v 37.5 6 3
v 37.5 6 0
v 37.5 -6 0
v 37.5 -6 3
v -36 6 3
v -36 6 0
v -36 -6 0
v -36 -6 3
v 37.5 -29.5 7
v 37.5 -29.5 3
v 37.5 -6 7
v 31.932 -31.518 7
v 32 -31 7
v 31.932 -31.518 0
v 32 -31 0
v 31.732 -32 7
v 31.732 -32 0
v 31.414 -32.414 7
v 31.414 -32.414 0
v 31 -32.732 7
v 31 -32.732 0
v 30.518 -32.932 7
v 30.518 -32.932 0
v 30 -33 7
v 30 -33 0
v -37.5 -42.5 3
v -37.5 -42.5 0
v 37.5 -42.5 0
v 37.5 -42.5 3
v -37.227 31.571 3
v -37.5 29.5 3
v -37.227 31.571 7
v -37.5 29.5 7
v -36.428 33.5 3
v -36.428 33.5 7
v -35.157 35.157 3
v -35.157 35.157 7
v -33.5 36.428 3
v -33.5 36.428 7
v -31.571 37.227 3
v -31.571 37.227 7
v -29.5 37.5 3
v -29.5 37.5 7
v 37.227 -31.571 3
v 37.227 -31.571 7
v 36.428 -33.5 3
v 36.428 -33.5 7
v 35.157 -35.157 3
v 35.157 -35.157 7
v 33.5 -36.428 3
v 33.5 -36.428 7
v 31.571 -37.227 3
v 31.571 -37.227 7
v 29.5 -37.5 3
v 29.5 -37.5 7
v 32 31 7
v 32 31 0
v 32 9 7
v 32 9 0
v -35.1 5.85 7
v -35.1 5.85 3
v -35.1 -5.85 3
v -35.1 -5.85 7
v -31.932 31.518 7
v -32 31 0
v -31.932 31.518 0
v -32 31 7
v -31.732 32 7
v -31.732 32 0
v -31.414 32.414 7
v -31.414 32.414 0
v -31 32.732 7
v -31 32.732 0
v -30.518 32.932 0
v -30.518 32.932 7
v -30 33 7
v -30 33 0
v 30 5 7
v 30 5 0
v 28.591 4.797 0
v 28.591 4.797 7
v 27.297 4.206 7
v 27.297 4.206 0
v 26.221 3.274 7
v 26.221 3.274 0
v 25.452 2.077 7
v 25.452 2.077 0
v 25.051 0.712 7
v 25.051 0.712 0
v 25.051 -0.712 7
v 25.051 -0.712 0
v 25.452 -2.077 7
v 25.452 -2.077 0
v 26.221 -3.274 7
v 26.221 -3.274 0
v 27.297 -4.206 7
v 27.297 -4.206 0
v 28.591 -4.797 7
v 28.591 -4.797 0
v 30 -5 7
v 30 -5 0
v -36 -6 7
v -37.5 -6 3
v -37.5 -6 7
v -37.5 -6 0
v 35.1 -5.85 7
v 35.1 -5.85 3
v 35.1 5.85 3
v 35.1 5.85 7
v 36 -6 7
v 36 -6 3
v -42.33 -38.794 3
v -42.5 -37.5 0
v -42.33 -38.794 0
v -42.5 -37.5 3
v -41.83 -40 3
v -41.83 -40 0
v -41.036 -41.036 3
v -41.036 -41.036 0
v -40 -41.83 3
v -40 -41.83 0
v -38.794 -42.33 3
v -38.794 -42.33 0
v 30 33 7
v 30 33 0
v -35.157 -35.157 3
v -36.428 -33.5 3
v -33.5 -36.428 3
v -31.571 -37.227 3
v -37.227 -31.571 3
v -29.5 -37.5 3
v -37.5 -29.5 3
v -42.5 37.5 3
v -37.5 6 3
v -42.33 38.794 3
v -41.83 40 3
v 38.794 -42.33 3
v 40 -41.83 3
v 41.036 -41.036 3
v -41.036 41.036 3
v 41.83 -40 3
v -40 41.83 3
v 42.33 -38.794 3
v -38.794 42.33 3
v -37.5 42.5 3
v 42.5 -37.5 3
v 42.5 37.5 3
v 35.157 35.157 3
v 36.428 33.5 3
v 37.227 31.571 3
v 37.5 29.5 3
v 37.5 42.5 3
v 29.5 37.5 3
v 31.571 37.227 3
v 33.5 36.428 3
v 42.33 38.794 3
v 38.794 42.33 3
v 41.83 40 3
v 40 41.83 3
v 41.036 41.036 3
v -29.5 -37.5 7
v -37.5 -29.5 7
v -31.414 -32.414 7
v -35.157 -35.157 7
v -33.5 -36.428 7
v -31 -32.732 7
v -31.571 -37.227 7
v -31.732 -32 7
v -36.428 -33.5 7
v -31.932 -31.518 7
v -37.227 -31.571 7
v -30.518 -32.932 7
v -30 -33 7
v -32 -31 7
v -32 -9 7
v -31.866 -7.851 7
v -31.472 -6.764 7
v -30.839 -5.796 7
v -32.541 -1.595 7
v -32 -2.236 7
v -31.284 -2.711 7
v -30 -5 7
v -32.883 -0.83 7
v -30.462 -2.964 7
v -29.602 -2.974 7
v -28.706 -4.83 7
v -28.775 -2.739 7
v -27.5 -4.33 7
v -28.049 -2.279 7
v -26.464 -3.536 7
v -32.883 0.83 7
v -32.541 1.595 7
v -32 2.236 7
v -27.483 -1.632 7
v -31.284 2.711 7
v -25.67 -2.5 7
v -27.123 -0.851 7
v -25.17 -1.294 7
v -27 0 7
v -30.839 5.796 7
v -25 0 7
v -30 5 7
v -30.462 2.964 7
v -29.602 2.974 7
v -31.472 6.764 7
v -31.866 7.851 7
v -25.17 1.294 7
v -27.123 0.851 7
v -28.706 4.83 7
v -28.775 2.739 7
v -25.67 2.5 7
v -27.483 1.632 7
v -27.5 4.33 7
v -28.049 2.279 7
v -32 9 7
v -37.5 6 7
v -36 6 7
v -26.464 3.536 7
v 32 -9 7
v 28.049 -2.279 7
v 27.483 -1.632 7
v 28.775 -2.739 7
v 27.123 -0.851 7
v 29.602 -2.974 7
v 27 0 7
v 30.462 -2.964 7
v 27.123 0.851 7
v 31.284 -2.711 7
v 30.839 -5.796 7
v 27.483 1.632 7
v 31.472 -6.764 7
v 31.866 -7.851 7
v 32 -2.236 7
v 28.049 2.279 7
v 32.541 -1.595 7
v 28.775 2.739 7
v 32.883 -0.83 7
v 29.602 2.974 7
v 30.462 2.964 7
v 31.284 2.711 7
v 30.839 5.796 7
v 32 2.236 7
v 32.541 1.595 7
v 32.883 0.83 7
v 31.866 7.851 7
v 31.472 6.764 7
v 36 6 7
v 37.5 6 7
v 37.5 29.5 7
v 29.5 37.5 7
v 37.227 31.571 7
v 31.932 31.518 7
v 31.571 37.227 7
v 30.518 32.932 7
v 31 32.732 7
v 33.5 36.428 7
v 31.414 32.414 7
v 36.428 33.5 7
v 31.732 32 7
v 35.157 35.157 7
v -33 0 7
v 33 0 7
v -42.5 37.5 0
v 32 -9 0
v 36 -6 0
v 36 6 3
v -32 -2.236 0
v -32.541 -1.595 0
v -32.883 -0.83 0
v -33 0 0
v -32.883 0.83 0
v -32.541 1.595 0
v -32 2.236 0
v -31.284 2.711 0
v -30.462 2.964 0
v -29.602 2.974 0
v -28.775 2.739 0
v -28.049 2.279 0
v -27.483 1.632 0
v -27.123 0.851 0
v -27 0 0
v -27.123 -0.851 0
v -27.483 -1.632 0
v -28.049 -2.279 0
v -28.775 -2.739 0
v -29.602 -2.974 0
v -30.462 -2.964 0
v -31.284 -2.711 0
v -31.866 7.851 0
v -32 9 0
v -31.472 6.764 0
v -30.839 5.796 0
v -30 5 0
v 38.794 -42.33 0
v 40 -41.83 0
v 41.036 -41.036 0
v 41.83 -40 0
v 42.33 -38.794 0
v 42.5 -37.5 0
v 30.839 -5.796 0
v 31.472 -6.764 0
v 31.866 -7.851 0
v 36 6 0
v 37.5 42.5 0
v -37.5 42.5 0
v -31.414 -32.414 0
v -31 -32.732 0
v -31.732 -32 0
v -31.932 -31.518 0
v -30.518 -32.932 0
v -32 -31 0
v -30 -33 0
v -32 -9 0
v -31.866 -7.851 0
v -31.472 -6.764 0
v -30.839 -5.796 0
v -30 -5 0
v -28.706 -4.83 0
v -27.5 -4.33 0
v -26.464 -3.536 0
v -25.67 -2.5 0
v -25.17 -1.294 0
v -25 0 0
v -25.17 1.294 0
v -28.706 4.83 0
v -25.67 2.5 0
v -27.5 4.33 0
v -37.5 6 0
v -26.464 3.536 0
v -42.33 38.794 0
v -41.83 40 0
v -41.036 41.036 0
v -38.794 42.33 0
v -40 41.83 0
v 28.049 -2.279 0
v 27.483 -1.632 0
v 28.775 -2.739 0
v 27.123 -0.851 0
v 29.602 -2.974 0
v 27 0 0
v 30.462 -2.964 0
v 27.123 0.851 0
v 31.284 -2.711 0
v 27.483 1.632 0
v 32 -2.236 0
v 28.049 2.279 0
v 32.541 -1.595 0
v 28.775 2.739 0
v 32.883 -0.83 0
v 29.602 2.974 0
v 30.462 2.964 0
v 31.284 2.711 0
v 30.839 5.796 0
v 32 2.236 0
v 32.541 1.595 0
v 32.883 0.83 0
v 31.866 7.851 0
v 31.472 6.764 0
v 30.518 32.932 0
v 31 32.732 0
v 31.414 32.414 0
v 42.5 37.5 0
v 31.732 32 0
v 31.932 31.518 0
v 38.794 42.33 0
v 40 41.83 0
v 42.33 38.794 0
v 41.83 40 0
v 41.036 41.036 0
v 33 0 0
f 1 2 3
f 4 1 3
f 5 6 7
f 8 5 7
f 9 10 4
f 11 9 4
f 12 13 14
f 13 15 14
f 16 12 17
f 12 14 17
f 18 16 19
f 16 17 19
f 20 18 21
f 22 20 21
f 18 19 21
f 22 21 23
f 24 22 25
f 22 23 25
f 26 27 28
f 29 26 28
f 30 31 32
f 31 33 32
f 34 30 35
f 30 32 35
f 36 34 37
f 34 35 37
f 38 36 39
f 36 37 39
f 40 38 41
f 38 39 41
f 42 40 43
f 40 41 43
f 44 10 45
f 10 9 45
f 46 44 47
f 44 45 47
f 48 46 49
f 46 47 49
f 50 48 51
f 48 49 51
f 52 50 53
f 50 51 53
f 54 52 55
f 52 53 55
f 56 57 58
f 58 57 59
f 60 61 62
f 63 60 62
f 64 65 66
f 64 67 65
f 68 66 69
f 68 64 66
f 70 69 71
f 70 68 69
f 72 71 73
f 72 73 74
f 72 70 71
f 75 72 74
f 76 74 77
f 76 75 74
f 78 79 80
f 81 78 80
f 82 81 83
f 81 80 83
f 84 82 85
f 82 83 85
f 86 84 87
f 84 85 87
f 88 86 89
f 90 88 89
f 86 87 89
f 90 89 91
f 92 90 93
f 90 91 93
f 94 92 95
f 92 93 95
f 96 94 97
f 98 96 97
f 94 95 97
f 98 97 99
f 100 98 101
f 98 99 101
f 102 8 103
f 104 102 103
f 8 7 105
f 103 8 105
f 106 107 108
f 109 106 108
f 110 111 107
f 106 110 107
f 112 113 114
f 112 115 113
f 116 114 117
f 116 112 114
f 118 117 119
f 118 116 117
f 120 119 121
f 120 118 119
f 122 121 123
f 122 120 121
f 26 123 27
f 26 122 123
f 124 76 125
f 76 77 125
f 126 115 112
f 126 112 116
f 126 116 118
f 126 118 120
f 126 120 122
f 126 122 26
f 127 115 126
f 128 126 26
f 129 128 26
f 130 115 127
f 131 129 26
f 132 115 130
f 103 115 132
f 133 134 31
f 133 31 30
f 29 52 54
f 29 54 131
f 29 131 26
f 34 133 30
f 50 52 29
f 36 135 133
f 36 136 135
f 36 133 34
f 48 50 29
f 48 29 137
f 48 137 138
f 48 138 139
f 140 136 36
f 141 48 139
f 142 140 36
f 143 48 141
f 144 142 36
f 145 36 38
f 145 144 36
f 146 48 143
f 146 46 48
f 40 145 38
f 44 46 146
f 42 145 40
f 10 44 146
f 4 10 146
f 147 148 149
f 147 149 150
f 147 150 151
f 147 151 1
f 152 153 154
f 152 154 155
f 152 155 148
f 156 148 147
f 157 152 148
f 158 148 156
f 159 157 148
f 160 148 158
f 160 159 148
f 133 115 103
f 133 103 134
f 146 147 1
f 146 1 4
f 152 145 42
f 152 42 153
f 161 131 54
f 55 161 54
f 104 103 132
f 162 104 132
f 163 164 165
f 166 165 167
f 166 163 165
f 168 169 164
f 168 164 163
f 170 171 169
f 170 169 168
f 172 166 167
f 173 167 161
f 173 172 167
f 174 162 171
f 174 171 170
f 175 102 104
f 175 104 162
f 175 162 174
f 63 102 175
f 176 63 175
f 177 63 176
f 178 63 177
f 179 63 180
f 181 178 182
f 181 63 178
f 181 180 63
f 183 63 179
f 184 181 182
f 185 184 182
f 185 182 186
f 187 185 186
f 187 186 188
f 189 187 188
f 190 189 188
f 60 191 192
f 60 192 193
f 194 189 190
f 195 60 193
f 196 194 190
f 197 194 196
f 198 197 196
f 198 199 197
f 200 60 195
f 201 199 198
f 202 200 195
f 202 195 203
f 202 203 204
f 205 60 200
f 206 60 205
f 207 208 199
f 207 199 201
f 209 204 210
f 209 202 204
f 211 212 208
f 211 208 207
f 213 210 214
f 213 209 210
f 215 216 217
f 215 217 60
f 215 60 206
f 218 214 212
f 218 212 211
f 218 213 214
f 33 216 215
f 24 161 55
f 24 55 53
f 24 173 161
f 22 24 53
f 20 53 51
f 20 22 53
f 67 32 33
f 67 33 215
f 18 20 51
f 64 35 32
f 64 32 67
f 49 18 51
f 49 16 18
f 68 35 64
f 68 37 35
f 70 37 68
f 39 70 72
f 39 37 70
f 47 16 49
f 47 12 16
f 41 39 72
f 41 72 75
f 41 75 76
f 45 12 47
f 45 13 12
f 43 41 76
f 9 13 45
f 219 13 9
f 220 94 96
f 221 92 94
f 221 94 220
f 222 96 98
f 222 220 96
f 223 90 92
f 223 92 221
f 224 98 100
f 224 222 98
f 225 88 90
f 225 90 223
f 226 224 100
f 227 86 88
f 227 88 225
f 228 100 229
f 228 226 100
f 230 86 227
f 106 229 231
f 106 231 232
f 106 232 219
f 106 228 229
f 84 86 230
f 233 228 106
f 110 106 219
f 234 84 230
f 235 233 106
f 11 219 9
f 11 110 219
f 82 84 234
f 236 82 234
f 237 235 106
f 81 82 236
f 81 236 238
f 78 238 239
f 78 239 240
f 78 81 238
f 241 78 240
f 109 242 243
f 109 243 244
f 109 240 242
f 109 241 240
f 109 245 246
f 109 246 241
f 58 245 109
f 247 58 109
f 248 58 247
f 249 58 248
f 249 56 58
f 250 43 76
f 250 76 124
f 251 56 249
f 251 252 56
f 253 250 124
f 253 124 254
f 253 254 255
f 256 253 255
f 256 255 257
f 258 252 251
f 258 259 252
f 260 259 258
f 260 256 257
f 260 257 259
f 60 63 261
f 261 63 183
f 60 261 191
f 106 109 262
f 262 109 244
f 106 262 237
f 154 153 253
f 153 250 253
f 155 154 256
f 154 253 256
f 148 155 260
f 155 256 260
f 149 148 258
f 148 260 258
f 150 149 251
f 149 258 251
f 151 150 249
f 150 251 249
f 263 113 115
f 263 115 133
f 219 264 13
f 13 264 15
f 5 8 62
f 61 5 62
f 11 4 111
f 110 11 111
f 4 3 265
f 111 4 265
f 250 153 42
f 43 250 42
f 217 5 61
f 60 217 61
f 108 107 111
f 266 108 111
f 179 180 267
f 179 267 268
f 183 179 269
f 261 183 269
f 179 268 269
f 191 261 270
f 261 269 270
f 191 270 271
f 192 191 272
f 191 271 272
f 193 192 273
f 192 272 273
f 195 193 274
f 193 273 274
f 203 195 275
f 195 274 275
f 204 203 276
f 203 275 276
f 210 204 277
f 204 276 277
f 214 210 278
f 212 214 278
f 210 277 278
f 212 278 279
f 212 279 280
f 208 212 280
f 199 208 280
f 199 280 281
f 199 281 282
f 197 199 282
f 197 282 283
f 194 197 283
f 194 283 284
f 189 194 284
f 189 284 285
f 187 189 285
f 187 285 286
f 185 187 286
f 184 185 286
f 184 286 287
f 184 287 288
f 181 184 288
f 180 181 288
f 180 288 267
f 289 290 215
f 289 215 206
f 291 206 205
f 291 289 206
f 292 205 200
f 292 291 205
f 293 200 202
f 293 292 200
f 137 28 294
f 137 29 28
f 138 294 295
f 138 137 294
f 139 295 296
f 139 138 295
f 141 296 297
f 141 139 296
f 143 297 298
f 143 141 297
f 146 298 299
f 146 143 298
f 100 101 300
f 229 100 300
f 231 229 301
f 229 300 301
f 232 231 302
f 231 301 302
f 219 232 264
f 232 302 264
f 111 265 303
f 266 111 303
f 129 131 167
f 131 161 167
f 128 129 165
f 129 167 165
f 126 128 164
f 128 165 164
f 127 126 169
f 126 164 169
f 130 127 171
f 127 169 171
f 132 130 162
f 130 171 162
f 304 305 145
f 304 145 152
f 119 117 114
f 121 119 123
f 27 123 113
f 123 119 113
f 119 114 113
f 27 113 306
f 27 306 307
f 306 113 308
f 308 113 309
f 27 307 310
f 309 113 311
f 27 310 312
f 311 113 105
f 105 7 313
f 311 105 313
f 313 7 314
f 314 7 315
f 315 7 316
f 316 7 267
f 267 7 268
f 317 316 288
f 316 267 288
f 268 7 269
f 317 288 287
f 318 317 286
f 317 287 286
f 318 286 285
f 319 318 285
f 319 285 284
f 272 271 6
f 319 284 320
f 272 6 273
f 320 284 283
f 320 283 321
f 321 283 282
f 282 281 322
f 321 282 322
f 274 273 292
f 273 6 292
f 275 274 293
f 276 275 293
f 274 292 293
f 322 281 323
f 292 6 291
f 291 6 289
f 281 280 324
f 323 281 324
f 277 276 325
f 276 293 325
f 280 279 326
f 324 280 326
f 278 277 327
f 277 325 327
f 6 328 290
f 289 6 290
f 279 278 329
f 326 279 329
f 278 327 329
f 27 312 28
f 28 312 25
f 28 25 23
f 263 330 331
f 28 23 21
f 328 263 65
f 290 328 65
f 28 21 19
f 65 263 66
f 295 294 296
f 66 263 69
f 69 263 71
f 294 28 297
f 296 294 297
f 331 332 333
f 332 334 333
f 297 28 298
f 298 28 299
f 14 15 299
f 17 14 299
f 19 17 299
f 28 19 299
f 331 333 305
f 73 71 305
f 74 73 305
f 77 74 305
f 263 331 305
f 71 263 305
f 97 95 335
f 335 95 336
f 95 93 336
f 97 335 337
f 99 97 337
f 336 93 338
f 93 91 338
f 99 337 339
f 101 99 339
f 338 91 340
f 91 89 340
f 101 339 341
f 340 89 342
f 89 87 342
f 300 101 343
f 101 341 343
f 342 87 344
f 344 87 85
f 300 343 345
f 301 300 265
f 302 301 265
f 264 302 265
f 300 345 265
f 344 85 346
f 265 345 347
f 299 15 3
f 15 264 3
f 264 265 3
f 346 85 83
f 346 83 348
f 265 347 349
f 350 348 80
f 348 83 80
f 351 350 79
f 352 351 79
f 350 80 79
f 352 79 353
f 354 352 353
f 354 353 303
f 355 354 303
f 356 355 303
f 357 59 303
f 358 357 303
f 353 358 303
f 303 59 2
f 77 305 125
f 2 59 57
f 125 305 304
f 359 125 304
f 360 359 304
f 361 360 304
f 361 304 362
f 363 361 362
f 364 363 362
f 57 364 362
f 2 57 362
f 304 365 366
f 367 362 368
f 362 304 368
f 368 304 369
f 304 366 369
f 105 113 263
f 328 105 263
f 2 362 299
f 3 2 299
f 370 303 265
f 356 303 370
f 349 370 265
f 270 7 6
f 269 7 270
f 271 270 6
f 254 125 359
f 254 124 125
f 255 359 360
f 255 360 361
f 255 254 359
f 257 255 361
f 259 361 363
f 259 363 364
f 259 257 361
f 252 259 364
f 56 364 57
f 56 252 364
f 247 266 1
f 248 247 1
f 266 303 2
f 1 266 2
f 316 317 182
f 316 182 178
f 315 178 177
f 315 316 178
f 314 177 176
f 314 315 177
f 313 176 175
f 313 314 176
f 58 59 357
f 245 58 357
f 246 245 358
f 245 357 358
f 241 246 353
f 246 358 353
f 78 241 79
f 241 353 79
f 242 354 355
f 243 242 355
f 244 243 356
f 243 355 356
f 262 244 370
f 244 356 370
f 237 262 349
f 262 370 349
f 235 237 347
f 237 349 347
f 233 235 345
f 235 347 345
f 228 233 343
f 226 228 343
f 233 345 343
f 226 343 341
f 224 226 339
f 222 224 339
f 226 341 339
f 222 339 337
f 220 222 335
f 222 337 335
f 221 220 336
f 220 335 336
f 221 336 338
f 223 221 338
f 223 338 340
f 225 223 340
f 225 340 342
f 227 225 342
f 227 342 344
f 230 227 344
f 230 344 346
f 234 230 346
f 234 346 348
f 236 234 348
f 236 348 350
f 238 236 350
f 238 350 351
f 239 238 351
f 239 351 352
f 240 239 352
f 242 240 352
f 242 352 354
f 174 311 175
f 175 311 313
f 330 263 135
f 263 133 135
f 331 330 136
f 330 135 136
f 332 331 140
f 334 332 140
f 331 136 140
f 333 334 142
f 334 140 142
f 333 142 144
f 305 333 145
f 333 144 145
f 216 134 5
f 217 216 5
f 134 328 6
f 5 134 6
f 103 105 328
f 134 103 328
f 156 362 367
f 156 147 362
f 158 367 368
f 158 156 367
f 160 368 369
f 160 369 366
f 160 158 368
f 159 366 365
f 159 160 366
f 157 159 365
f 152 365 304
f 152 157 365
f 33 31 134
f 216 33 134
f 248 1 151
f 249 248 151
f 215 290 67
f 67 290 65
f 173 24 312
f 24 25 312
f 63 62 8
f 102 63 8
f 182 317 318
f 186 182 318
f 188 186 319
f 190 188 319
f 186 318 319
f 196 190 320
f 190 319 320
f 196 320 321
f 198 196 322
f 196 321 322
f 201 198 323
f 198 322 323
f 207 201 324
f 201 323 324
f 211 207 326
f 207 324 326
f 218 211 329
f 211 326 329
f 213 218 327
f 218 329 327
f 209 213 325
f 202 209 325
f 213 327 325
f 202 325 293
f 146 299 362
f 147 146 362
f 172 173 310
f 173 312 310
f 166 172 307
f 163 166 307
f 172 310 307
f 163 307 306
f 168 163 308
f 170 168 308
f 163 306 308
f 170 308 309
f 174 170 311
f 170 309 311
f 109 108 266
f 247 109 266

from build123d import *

# Parameters (mm, degrees)
F0_W        = 85
F0_H        = 85
F1_DEPTH    = 3
F2_R        = 5
F3_DEPTH    = 7
F4_R        = 8
F5_R        = 2
F6_T1_DEPTH = 7


# Not quite as in the source:
# - a fillet or chamfer that OpenCascade refuses, or shapes differently, is made with other operations: its cross-section is extruded or revolved along the edge and cut away or added


with BuildPart() as f1:
    # F0 (on Top) → F1 (new body)
    with BuildSketch(Plane.XY):
        Rectangle(F0_W, F0_H)
        Polygon((-37.5, -6), (-37.5, 6), (-37.5, 37.5), (37.5, 37.5), (37.5, 6), (37.5, -6), (37.5, -37.5), (-37.5, -37.5), align=None, mode=Mode.SUBTRACT)
        Polygon((-35.1, -35.1), (-35.1, -5.85), (-36, -6), (-37.5, -6), (-37.5, -37.5), (37.5, -37.5), (37.5, -6), (36, -6), (35.1, -5.85), (35.1, -35.1), align=None)
        Polygon((-36, 6), (-35.1, 5.85), (-35.1, 35.1), (35.1, 35.1), (35.1, 5.85), (36, 6), (37.5, 6), (37.5, 37.5), (-37.5, 37.5), (-37.5, 6), align=None)
        Polygon((-32, 5.3333333333), (-32, 33), (32, 33), (32, 5.3333333333), (35.1, 5.85), (35.1, 35.1), (-35.1, 35.1), (-35.1, 5.85), align=None)
        with BuildLine():
            Line((-32, 4.582575695), (-32, 5.3333333333))
            Line((-32, 5.3333333333), (-35.1, 5.85))
            Line((-35.1, 5.85), (-35.1, -5.85))
            Line((-35.1, -5.85), (-32, -5.3333333333))
            Line((-32, -5.3333333333), (-32, -4.582575695))
            ThreePointArc((-32, -4.582575695), (-35, 0), (-32, 4.582575695))
        make_face()
        Polygon((-35.1, -5.85), (-35.1, 5.85), (-36, 6), (-36, -6), align=None)
        with BuildLine():
            ThreePointArc((-30, 5), (-31.0215482184, 4.8945315647), (-32, 4.582575695))
            Line((-32, 4.582575695), (-32, 2.2360679775))
            ThreePointArc((-32, 2.2360679775), (-28.7752551286, 2.7386127875), (-27, 0))
            ThreePointArc((-27, 0), (-28.7752551286, -2.7386127875), (-32, -2.2360679775))
            Line((-32, -2.2360679775), (-32, -4.582575695))
            ThreePointArc((-32, -4.582575695), (-31.0215482184, -4.8945315647), (-30, -5))
            ThreePointArc((-30, -5), (-26.4644660941, -3.5355339059), (-25, 0))
            ThreePointArc((-25, 0), (-26.4644660941, 3.5355339059), (-30, 5))
        make_face()
        with BuildLine():
            Line((-30, 5), (-32, 5.3333333333))
            Line((-32, 5.3333333333), (-32, 4.582575695))
            ThreePointArc((-32, 4.582575695), (-31.0215482184, 4.8945315647), (-30, 5))
        make_face()
        with BuildLine():
            ThreePointArc((-30, -5), (-31.0215482184, -4.8945315647), (-32, -4.582575695))
            Line((-32, -4.582575695), (-32, -5.3333333333))
            Line((-32, -5.3333333333), (-30, -5))
        make_face()
        Polygon((-32, -5.3333333333), (-35.1, -5.85), (-35.1, -35.1), (35.1, -35.1), (35.1, -5.85), (32, -5.3333333333), (32, -33), (-32, -33), align=None)
        with BuildLine():
            Line((35.1, 5.85), (32, 5.3333333333))
            Line((32, 5.3333333333), (32, 4.582575695))
            ThreePointArc((32, 4.582575695), (34.1833001327, 2.7386127875), (35, 0))
            ThreePointArc((35, 0), (34.1833001327, -2.7386127875), (32, -4.582575695))
            Line((32, -4.582575695), (32, -5.3333333333))
            Line((32, -5.3333333333), (35.1, -5.85))
            Line((35.1, -5.85), (35.1, 5.85))
        make_face()
        with BuildLine():
            Line((32, 4.582575695), (32, 5.3333333333))
            Line((32, 5.3333333333), (30, 5))
            ThreePointArc((30, 5), (31.0215482184, 4.8945315647), (32, 4.582575695))
        make_face()
        with BuildLine():
            ThreePointArc((32, -4.582575695), (31.0215482184, -4.8945315647), (30, -5))
            Line((30, -5), (32, -5.3333333333))
            Line((32, -5.3333333333), (32, -4.582575695))
        make_face()
        with BuildLine():
            Line((32, 2.2360679775), (32, 4.582575695))
            ThreePointArc((32, 4.582575695), (31.0215482184, 4.8945315647), (30, 5))
            ThreePointArc((30, 5), (25, 0), (30, -5))
            ThreePointArc((30, -5), (31.0215482184, -4.8945315647), (32, -4.582575695))
            Line((32, -4.582575695), (32, -2.2360679775))
            ThreePointArc((32, -2.2360679775), (27, 0), (32, 2.2360679775))
        make_face()
        with BuildLine():
            ThreePointArc((35, 0), (34.1833001327, 2.7386127875), (32, 4.582575695))
            Line((32, 4.582575695), (32, 2.2360679775))
            ThreePointArc((32, 2.2360679775), (32.7386127875, 1.2247448714), (33, 0))
            ThreePointArc((33, 0), (32.7386127875, -1.2247448714), (32, -2.2360679775))
            Line((32, -2.2360679775), (32, -4.582575695))
            ThreePointArc((32, -4.582575695), (34.1833001327, -2.7386127875), (35, 0))
        make_face()
        with BuildLine():
            Line((-32, 2.2360679775), (-32, 4.582575695))
            ThreePointArc((-32, 4.582575695), (-35, 0), (-32, -4.582575695))
            Line((-32, -4.582575695), (-32, -2.2360679775))
            ThreePointArc((-32, -2.2360679775), (-33, 0), (-32, 2.2360679775))
        make_face()
        Polygon((36, 6), (35.1, 5.85), (35.1, -5.85), (36, -6), align=None)
    extrude(amount=F1_DEPTH)

    # F2
    f2_edges = [f1.edges().sort_by_distance(p)[0] for p in [
        (-42.5, 42.5, 1.5),
        (-42.5, -42.5, 1.5),
        (42.5, -42.5, 1.5),
        (42.5, 42.5, 1.5),
    ]]
    fillet(f2_edges, radius=F2_R)

    # F0 (on Top) → F3 (join)
    with BuildSketch(Plane.XY):
        with BuildLine():
            Line((-32, 4.582575695), (-32, 5.3333333333))
            Line((-32, 5.3333333333), (-35.1, 5.85))
            Line((-35.1, 5.85), (-35.1, -5.85))
            Line((-35.1, -5.85), (-32, -5.3333333333))
            Line((-32, -5.3333333333), (-32, -4.582575695))
            ThreePointArc((-32, -4.582575695), (-35, 0), (-32, 4.582575695))
        make_face()
        with BuildLine():
            Line((-30, 5), (-32, 5.3333333333))
            Line((-32, 5.3333333333), (-32, 4.582575695))
            ThreePointArc((-32, 4.582575695), (-31.0215482184, 4.8945315647), (-30, 5))
        make_face()
        with BuildLine():
            ThreePointArc((-30, 5), (-31.0215482184, 4.8945315647), (-32, 4.582575695))
            Line((-32, 4.582575695), (-32, 2.2360679775))
            ThreePointArc((-32, 2.2360679775), (-28.7752551286, 2.7386127875), (-27, 0))
            ThreePointArc((-27, 0), (-28.7752551286, -2.7386127875), (-32, -2.2360679775))
            Line((-32, -2.2360679775), (-32, -4.582575695))
            ThreePointArc((-32, -4.582575695), (-31.0215482184, -4.8945315647), (-30, -5))
            ThreePointArc((-30, -5), (-26.4644660941, -3.5355339059), (-25, 0))
            ThreePointArc((-25, 0), (-26.4644660941, 3.5355339059), (-30, 5))
        make_face()
        with BuildLine():
            Line((-32, 2.2360679775), (-32, 4.582575695))
            ThreePointArc((-32, 4.582575695), (-35, 0), (-32, -4.582575695))
            Line((-32, -4.582575695), (-32, -2.2360679775))
            ThreePointArc((-32, -2.2360679775), (-33, 0), (-32, 2.2360679775))
        make_face()
        with BuildLine():
            ThreePointArc((-30, -5), (-31.0215482184, -4.8945315647), (-32, -4.582575695))
            Line((-32, -4.582575695), (-32, -5.3333333333))
            Line((-32, -5.3333333333), (-30, -5))
        make_face()
        Polygon((-32, -5.3333333333), (-35.1, -5.85), (-35.1, -35.1), (35.1, -35.1), (35.1, -5.85), (32, -5.3333333333), (32, -33), (-32, -33), align=None)
        Polygon((-35.1, -35.1), (-35.1, -5.85), (-36, -6), (-37.5, -6), (-37.5, -37.5), (37.5, -37.5), (37.5, -6), (36, -6), (35.1, -5.85), (35.1, -35.1), align=None)
        Polygon((-36, 6), (-35.1, 5.85), (-35.1, 35.1), (35.1, 35.1), (35.1, 5.85), (36, 6), (37.5, 6), (37.5, 37.5), (-37.5, 37.5), (-37.5, 6), align=None)
        Polygon((-32, 5.3333333333), (-32, 33), (32, 33), (32, 5.3333333333), (35.1, 5.85), (35.1, 35.1), (-35.1, 35.1), (-35.1, 5.85), align=None)
        with BuildLine():
            ThreePointArc((32, -4.582575695), (31.0215482184, -4.8945315647), (30, -5))
            Line((30, -5), (32, -5.3333333333))
            Line((32, -5.3333333333), (32, -4.582575695))
        make_face()
        with BuildLine():
            Line((32, 2.2360679775), (32, 4.582575695))
            ThreePointArc((32, 4.582575695), (31.0215482184, 4.8945315647), (30, 5))
            ThreePointArc((30, 5), (25, 0), (30, -5))
            ThreePointArc((30, -5), (31.0215482184, -4.8945315647), (32, -4.582575695))
            Line((32, -4.582575695), (32, -2.2360679775))
            ThreePointArc((32, -2.2360679775), (27, 0), (32, 2.2360679775))
        make_face()
        with BuildLine():
            Line((32, 4.582575695), (32, 5.3333333333))
            Line((32, 5.3333333333), (30, 5))
            ThreePointArc((30, 5), (31.0215482184, 4.8945315647), (32, 4.582575695))
        make_face()
        with BuildLine():
            ThreePointArc((35, 0), (34.1833001327, 2.7386127875), (32, 4.582575695))
            Line((32, 4.582575695), (32, 2.2360679775))
            ThreePointArc((32, 2.2360679775), (32.7386127875, 1.2247448714), (33, 0))
            ThreePointArc((33, 0), (32.7386127875, -1.2247448714), (32, -2.2360679775))
            Line((32, -2.2360679775), (32, -4.582575695))
            ThreePointArc((32, -4.582575695), (34.1833001327, -2.7386127875), (35, 0))
        make_face()
        with BuildLine():
            Line((35.1, 5.85), (32, 5.3333333333))
            Line((32, 5.3333333333), (32, 4.582575695))
            ThreePointArc((32, 4.582575695), (34.1833001327, 2.7386127875), (35, 0))
            ThreePointArc((35, 0), (34.1833001327, -2.7386127875), (32, -4.582575695))
            Line((32, -4.582575695), (32, -5.3333333333))
            Line((32, -5.3333333333), (35.1, -5.85))
            Line((35.1, -5.85), (35.1, 5.85))
        make_face()
    extrude(amount=F3_DEPTH)

    # F4
    f4_edges = [f1.edges().sort_by_distance(p)[0] for p in [
        (-37.5, -37.5, 5),
        (37.5, -37.5, 5),
        (37.5, 37.5, 5),
        (-37.5, 37.5, 5),
    ]]
    fillet(f4_edges, radius=F4_R)

    # F5
    f5_edges = [f1.edges().sort_by_distance(p)[0] for p in [
        (32, -33, 3.5),
        (-32, -33, 3.5),
        (-32, 33, 3.5),
        (32, 33, 3.5),
    ]]
    fillet(f5_edges, radius=F5_R)

    # F6: fillet of radius 5 on 4 edges, made by hand

    # F6_s2 → F6_t1 (join)
    with BuildSketch(Plane.XY):
        with BuildLine():
            ThreePointArc((30, -5), (31.472135955, -6.7639320225), (32, -9))
            Line((32, -9), (32, -5.3333333333))
            Line((32, -5.3333333333), (30, -5))
        make_face()
        with BuildLine():
            ThreePointArc((32, 9), (31.472135955, 6.7639320225), (30, 5))
            Line((30, 5), (32, 5.3333333333))
            Line((32, 5.3333333333), (32, 9))
        make_face()
        with BuildLine():
            ThreePointArc((-32, 9), (-31.472135955, 6.7639320225), (-30, 5))
            Line((-30, 5), (-32, 5.3333333333))
            Line((-32, 5.3333333333), (-32, 9))
        make_face()
        with BuildLine():
            ThreePointArc((-30, -5), (-31.472135955, -6.7639320225), (-32, -9))
            Line((-32, -9), (-32, -5.3333333333))
            Line((-32, -5.3333333333), (-30, -5))
        make_face()
    extrude(amount=F6_T1_DEPTH)


solid = f1.part
